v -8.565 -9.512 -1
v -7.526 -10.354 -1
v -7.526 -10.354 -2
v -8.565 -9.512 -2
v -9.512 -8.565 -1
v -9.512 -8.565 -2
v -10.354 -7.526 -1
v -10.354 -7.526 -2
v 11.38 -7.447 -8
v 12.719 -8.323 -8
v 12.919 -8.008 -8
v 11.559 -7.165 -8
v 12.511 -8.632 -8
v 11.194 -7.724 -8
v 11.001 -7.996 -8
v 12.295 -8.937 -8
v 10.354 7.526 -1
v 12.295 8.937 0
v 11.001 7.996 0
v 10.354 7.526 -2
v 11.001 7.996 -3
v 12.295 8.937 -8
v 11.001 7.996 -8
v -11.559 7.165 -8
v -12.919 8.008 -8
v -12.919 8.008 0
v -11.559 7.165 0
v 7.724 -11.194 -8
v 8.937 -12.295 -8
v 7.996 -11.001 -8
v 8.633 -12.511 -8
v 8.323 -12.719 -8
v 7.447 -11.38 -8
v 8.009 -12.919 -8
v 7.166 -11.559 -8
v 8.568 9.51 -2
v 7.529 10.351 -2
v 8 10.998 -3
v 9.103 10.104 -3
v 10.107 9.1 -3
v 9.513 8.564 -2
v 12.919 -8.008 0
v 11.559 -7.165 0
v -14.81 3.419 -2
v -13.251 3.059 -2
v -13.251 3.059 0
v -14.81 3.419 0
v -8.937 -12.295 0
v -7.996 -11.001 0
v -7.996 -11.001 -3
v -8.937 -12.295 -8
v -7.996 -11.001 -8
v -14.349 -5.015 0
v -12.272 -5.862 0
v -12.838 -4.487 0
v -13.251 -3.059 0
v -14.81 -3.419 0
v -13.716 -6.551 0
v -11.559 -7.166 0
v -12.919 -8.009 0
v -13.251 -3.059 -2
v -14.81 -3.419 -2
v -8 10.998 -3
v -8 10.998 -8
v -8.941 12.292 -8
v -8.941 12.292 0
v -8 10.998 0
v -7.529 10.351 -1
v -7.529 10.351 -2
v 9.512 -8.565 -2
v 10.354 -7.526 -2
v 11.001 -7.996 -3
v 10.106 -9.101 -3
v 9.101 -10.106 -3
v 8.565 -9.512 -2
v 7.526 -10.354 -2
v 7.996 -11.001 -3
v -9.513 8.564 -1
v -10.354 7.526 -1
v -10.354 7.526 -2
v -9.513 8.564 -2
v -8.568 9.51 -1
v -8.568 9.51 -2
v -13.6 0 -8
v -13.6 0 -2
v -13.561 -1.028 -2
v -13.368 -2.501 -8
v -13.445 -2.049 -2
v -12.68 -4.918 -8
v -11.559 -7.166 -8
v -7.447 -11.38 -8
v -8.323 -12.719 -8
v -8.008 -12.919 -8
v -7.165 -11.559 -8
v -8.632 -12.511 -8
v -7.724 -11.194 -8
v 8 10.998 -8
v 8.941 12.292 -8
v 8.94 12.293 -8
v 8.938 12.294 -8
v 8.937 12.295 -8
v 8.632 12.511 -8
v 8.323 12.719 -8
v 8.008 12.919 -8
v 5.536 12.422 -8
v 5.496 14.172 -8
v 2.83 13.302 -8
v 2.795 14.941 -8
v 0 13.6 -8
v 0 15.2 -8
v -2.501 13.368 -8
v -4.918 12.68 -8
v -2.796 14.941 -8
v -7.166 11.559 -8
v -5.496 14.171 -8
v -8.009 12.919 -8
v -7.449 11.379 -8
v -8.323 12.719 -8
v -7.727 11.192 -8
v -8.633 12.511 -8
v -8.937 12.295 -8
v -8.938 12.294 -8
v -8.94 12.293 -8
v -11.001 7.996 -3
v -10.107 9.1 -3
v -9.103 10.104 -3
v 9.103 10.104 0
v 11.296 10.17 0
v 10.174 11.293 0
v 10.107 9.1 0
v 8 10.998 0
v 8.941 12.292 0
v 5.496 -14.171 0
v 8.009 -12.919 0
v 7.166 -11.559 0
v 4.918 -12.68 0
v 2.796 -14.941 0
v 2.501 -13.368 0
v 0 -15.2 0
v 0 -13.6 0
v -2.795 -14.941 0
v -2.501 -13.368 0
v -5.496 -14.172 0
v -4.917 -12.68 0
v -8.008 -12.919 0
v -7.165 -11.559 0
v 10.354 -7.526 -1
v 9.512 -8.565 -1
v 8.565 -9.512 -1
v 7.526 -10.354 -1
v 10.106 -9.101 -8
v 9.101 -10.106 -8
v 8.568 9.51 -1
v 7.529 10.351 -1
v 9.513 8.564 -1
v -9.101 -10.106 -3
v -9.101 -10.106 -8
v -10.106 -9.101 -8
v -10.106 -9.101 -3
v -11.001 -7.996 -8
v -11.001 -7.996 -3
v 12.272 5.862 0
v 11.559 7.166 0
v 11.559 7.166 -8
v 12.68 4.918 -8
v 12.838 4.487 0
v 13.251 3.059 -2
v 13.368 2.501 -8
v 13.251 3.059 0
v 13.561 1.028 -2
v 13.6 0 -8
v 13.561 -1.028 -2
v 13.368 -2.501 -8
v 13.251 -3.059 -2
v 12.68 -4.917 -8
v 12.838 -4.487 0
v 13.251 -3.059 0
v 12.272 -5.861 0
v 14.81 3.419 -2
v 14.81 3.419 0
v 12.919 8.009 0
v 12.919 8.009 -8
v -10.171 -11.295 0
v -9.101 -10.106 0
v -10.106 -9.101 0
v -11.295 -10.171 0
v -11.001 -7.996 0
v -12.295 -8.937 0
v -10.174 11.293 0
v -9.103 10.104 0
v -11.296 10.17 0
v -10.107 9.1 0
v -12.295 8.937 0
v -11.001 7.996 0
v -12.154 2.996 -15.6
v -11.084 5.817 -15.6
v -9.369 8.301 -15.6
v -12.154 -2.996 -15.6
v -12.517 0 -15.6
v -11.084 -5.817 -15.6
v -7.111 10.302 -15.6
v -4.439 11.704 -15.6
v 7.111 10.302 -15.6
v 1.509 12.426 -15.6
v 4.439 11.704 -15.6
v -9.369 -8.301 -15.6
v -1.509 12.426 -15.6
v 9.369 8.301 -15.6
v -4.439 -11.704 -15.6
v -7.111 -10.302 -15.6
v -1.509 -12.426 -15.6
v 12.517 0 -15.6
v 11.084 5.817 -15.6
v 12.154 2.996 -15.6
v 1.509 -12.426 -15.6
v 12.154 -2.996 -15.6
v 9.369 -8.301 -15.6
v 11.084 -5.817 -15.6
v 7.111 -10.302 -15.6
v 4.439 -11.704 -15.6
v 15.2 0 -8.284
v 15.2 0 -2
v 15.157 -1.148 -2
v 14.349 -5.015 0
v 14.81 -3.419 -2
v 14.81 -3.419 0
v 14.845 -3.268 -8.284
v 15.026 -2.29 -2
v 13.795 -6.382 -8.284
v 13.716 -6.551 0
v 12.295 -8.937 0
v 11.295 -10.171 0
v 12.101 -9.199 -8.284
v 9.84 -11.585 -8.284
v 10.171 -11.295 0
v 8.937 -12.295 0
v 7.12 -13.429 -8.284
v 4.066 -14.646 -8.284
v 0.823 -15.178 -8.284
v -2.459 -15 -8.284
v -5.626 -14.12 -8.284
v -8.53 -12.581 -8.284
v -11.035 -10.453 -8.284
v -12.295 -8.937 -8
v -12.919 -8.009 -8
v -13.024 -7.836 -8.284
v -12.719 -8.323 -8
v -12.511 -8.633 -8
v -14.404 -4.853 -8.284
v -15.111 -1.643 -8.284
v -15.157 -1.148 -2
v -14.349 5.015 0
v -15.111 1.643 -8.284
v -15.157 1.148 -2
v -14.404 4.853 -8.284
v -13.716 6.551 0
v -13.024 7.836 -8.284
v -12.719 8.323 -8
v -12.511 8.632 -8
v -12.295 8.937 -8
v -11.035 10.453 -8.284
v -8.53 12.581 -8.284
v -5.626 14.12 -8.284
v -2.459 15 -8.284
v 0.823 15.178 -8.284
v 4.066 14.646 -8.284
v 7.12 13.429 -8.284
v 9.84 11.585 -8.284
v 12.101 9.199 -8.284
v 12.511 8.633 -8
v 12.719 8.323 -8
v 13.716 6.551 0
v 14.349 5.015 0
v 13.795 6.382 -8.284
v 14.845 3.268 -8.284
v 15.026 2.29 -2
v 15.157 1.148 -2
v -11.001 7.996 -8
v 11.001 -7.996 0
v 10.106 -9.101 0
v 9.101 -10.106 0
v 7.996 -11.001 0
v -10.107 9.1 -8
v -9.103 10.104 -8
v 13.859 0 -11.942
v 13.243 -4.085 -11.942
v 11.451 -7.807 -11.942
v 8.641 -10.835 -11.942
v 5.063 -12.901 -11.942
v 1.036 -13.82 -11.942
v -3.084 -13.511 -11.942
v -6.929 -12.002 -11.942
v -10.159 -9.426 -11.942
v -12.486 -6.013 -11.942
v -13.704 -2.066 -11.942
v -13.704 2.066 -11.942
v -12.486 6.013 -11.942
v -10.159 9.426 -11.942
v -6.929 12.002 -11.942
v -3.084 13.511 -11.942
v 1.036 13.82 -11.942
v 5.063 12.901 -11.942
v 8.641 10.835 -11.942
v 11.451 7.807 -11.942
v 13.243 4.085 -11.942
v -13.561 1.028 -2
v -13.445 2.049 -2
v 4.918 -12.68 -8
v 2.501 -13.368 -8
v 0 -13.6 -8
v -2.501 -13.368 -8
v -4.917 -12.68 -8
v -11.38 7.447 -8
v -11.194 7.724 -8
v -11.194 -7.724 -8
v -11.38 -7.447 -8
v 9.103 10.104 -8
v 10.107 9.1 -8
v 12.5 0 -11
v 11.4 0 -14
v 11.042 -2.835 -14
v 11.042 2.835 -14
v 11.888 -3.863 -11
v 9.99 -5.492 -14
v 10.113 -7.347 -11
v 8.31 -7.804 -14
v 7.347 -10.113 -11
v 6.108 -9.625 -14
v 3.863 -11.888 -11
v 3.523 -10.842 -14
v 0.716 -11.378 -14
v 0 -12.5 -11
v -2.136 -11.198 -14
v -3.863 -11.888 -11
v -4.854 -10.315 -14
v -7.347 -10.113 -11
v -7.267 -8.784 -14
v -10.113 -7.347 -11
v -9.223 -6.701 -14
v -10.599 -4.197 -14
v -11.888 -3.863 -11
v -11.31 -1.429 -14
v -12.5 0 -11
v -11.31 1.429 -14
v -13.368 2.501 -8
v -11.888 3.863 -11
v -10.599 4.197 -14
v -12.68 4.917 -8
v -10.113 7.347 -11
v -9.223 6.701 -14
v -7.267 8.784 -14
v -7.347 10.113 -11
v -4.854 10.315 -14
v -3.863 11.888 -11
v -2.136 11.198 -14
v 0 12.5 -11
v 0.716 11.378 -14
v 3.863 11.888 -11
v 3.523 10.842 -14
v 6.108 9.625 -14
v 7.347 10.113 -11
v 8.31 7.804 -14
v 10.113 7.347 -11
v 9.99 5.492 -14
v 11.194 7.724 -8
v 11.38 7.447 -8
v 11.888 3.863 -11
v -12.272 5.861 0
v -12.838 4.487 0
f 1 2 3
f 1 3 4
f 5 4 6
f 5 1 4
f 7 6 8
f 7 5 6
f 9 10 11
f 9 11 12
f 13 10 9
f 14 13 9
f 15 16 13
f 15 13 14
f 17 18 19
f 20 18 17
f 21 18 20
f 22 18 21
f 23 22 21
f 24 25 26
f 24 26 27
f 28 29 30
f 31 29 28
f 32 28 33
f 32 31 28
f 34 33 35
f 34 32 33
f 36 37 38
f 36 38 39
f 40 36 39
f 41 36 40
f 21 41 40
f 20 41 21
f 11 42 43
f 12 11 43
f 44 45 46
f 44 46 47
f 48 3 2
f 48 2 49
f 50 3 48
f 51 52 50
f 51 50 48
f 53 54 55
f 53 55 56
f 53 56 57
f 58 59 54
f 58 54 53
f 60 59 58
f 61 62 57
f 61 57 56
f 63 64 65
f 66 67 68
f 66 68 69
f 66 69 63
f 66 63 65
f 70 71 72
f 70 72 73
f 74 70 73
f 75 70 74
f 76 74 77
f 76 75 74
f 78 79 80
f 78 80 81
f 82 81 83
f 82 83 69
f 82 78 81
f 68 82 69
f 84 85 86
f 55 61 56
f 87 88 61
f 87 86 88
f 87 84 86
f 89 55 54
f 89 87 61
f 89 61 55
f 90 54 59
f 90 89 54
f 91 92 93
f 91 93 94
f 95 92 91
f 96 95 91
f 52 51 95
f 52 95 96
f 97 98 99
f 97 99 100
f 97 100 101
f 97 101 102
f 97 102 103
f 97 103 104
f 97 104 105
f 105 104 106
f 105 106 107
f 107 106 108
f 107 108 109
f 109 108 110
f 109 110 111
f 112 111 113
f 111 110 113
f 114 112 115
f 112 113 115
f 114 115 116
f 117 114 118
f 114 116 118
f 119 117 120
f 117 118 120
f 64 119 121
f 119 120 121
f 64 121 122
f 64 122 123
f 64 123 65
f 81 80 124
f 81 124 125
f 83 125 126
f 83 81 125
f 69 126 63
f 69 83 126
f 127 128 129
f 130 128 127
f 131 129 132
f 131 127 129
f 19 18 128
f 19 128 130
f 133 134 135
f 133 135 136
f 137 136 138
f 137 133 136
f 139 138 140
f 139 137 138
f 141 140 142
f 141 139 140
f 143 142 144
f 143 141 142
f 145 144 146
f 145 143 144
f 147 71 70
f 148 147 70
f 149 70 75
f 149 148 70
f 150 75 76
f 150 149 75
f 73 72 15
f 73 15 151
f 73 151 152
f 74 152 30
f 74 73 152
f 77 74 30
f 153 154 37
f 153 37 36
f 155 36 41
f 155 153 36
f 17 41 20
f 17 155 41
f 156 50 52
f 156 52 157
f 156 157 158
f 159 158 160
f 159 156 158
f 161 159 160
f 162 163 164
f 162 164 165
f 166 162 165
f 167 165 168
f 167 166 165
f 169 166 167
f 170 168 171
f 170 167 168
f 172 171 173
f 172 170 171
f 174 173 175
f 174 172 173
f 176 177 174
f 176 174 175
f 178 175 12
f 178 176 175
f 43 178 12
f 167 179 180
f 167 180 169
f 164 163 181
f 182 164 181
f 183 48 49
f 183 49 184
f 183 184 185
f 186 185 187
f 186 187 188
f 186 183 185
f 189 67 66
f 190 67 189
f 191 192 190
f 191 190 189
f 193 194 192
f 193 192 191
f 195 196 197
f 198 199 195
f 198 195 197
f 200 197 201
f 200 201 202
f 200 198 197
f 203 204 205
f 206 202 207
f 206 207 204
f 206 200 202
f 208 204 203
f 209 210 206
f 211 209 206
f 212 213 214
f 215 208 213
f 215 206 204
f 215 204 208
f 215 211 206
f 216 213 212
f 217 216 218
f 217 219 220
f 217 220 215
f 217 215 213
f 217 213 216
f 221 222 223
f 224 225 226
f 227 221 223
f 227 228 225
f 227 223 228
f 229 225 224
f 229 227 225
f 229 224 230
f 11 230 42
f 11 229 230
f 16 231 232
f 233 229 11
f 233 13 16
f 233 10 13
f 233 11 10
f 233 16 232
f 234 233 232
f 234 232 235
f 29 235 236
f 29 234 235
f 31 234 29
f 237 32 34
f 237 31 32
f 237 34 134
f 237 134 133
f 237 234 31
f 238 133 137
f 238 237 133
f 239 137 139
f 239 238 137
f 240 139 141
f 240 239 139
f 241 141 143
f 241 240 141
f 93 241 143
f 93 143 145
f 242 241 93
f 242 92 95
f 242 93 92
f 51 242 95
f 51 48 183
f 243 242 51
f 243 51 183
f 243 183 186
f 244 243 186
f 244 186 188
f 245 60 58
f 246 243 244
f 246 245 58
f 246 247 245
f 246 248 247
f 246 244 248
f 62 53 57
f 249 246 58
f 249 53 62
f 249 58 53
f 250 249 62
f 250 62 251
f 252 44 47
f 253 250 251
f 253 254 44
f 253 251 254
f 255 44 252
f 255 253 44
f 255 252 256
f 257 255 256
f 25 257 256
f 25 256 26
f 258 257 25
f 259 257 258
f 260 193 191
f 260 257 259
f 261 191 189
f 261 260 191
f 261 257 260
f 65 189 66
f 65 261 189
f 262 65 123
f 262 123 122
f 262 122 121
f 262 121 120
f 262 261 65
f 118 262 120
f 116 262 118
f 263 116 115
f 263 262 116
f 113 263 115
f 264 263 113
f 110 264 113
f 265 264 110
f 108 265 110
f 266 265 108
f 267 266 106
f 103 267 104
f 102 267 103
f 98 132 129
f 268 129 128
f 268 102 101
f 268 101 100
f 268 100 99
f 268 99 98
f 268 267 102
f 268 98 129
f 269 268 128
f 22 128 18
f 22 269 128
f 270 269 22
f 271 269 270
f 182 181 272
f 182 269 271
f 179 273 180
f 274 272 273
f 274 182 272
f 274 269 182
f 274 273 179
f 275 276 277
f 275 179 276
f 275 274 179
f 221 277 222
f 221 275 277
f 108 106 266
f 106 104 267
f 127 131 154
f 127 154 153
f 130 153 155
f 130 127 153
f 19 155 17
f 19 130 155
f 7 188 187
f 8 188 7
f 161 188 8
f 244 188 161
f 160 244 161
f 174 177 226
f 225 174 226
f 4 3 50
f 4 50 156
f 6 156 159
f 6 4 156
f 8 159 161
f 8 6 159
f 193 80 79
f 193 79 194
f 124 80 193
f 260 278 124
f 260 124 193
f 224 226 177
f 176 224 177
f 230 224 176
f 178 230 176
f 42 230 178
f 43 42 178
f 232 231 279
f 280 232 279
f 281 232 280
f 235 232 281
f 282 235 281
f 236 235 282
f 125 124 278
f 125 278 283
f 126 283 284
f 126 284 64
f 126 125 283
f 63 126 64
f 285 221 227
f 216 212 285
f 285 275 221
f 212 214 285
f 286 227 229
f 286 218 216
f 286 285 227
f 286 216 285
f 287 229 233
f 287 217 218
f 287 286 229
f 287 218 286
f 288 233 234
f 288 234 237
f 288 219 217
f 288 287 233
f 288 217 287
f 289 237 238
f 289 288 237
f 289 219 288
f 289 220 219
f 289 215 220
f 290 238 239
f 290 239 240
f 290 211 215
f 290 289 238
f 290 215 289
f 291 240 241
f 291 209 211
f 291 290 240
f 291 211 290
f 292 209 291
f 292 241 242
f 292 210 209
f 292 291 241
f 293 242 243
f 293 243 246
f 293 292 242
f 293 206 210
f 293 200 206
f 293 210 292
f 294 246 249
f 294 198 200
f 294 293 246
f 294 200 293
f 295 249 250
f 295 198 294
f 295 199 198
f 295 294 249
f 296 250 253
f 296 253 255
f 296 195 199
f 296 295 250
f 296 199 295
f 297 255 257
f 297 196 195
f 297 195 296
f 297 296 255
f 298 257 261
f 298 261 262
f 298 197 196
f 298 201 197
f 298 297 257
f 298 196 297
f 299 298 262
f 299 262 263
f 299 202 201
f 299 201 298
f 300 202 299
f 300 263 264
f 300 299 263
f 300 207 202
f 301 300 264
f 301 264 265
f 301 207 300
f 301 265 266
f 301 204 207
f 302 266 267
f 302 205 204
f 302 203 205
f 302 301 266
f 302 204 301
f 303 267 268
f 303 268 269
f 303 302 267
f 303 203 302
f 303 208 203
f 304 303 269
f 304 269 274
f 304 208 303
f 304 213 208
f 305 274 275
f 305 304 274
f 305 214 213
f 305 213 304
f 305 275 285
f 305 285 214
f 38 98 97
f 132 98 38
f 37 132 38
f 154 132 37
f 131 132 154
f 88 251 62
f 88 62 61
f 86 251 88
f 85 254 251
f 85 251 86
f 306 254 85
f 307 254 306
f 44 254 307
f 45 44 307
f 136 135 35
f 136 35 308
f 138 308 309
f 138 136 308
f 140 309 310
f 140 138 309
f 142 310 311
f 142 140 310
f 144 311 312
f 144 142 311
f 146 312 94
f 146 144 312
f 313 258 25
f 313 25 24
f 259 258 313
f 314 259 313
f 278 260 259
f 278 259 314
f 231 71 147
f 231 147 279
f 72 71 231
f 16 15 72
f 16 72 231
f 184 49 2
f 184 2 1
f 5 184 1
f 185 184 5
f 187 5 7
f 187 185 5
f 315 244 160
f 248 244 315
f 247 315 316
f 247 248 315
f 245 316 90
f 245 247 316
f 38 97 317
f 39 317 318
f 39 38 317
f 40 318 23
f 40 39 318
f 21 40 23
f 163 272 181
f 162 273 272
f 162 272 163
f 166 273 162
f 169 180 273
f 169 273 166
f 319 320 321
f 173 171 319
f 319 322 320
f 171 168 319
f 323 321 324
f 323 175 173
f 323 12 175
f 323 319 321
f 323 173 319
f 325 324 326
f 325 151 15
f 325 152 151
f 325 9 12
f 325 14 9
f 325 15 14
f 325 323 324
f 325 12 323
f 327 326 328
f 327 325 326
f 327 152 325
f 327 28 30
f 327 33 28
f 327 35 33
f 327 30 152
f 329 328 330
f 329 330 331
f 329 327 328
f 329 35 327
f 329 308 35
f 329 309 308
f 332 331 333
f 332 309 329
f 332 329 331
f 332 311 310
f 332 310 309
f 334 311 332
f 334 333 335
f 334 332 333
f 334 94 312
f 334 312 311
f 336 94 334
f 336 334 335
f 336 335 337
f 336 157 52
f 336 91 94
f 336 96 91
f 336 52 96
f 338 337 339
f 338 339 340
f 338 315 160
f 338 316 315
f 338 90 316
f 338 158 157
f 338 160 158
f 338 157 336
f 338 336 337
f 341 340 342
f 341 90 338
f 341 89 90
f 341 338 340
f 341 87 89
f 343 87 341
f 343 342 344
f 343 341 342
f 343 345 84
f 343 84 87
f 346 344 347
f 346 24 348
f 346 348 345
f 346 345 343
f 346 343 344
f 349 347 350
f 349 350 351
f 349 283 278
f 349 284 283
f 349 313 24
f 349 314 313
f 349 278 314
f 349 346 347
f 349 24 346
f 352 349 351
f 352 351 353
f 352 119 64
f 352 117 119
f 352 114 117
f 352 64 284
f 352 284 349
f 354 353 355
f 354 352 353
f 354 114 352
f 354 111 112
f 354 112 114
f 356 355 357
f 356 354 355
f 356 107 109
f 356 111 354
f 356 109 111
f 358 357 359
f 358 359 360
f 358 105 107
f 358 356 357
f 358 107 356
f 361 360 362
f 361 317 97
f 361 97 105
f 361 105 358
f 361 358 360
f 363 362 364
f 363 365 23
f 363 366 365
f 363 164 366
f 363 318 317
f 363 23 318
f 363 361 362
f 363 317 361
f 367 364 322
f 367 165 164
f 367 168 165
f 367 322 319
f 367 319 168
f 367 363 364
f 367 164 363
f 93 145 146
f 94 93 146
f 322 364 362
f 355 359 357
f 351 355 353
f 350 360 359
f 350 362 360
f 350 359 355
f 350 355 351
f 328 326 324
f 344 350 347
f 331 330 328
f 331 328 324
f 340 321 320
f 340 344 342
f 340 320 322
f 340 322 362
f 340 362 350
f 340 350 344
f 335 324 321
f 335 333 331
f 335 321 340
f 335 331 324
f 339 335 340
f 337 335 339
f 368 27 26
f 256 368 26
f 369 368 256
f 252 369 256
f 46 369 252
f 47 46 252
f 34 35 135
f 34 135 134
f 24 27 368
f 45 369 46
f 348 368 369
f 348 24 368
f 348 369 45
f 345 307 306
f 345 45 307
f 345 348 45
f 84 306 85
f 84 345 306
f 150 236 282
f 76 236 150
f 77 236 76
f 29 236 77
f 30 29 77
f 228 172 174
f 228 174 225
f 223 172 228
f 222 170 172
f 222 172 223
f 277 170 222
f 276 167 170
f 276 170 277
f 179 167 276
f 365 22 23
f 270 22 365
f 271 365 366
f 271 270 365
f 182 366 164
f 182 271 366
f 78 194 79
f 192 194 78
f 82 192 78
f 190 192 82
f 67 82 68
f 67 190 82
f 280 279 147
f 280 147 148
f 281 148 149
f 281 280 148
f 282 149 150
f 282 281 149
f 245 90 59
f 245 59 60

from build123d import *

# Parameters (mm, degrees)
CUT_EXTRUDE1_DEPTH = 8
CUT_EXTRUDE2_START = -8
CUT_EXTRUDE2_DEPTH = 8
CIRPATTERN1_COUNT  = 4
CUT_EXTRUDE3_START = -2
CUT_EXTRUDE3_DEPTH = 2


with BuildPart() as part:
    # Sketch1 → Revolve1 (revolve)
    with BuildSketch(Plane(origin=(0, 0, 0), x_dir=(0, 0, -1), z_dir=(1, 0, 0)), mode=Mode.PRIVATE) as revolve1_sk:
        Polygon((0, 15.2), (8.284085908, 15.2), (15.6, 12.517498166), (15.6, 0), (14, 0), (14, 11.4), (8, 13.6), (3, 13.6), (2, 12.8), (1, 12.8), (0, 13.6), align=None)
    revolve(revolve1_sk.sketch.rotate(Axis((0, 0, -14), (0, 0, -1)), 90), axis=Axis((0, 0, -14), (0, 0, -1)))

    # Sketch2 → Cut-Extrude1 (cut)
    with BuildSketch(Plane.XY):
        Polygon((-11.056373105, 15.2), (11.056373105, 15.2), (7.529411765, 10.351229805), (-7.529411765, 10.351229805), align=None)
    extrude(amount=-CUT_EXTRUDE1_DEPTH, mode=Mode.SUBTRACT)

    # Sketch3 → Cut-Extrude2 (cut)
    with BuildSketch(Plane.XY.offset(CUT_EXTRUDE2_START)):
        with BuildLine():
            Line((-8.936632298, 12.295389509), (-7.525585093, 10.354012218))
            Line((-7.525585093, 10.354012218), (-10.354012218, 7.525585093))
            Line((-10.354012218, 7.525585093), (-12.295389509, 8.936632298))
            ThreePointArc((-12.295389509, 8.936632298), (-12.615841165, 8.478239894), (-12.919211808, 8.008368514))
            Line((-12.919211808, 8.008368514), (-11.559294775, 7.165382355))
            ThreePointArc((-11.559294775, 7.165382355), (-13.079877846, 3.725157114), (-13.6, 0))
            Line((-13.6, 0), (0, 0))
            Line((0, 0), (0, 13.6))
            ThreePointArc((0, 13.6), (-3.725483093, 13.079785003), (-7.165958512, 11.558937607))
            Line((-7.165958512, 11.558937607), (-8.009012455, 12.918812619))
            ThreePointArc((-8.009012455, 12.918812619), (-8.478554306, 12.615629865), (-8.936632298, 12.295389509))
        make_face()
    cut_extrude2 = extrude(amount=CUT_EXTRUDE2_DEPTH, mode=Mode.SUBTRACT)

    # CirPattern1: Cut-Extrude2 ×4 about axis
    cirpattern1_axis = Axis((0, 0, 0), (0, 0, 1))
    for i in range(1, CIRPATTERN1_COUNT):
        add(cut_extrude2.rotate(cirpattern1_axis, i * 360 / CIRPATTERN1_COUNT), mode=Mode.SUBTRACT)

    # Sketch4 → Cut-Extrude3 (cut)
    with BuildSketch(Plane.XY.offset(CUT_EXTRUDE3_START)):
        with BuildLine():
            Line((-14.810424985, -3.419256026), (0, 0))
            Line((0, 0), (-14.810424985, 3.419256026))
            ThreePointArc((-14.810424985, 3.419256026), (-15.2, 0), (-14.810424985, -3.419256026))
        make_face()
        with BuildLine():
            Line((14.810424985, 3.419256026), (0, 0))
            Line((0, 0), (14.810424985, -3.419256026))
            ThreePointArc((14.810424985, -3.419256026), (15.2, 0), (14.810424985, 3.419256026))
        make_face()
    extrude(amount=CUT_EXTRUDE3_DEPTH, mode=Mode.SUBTRACT)


solid = part.part
